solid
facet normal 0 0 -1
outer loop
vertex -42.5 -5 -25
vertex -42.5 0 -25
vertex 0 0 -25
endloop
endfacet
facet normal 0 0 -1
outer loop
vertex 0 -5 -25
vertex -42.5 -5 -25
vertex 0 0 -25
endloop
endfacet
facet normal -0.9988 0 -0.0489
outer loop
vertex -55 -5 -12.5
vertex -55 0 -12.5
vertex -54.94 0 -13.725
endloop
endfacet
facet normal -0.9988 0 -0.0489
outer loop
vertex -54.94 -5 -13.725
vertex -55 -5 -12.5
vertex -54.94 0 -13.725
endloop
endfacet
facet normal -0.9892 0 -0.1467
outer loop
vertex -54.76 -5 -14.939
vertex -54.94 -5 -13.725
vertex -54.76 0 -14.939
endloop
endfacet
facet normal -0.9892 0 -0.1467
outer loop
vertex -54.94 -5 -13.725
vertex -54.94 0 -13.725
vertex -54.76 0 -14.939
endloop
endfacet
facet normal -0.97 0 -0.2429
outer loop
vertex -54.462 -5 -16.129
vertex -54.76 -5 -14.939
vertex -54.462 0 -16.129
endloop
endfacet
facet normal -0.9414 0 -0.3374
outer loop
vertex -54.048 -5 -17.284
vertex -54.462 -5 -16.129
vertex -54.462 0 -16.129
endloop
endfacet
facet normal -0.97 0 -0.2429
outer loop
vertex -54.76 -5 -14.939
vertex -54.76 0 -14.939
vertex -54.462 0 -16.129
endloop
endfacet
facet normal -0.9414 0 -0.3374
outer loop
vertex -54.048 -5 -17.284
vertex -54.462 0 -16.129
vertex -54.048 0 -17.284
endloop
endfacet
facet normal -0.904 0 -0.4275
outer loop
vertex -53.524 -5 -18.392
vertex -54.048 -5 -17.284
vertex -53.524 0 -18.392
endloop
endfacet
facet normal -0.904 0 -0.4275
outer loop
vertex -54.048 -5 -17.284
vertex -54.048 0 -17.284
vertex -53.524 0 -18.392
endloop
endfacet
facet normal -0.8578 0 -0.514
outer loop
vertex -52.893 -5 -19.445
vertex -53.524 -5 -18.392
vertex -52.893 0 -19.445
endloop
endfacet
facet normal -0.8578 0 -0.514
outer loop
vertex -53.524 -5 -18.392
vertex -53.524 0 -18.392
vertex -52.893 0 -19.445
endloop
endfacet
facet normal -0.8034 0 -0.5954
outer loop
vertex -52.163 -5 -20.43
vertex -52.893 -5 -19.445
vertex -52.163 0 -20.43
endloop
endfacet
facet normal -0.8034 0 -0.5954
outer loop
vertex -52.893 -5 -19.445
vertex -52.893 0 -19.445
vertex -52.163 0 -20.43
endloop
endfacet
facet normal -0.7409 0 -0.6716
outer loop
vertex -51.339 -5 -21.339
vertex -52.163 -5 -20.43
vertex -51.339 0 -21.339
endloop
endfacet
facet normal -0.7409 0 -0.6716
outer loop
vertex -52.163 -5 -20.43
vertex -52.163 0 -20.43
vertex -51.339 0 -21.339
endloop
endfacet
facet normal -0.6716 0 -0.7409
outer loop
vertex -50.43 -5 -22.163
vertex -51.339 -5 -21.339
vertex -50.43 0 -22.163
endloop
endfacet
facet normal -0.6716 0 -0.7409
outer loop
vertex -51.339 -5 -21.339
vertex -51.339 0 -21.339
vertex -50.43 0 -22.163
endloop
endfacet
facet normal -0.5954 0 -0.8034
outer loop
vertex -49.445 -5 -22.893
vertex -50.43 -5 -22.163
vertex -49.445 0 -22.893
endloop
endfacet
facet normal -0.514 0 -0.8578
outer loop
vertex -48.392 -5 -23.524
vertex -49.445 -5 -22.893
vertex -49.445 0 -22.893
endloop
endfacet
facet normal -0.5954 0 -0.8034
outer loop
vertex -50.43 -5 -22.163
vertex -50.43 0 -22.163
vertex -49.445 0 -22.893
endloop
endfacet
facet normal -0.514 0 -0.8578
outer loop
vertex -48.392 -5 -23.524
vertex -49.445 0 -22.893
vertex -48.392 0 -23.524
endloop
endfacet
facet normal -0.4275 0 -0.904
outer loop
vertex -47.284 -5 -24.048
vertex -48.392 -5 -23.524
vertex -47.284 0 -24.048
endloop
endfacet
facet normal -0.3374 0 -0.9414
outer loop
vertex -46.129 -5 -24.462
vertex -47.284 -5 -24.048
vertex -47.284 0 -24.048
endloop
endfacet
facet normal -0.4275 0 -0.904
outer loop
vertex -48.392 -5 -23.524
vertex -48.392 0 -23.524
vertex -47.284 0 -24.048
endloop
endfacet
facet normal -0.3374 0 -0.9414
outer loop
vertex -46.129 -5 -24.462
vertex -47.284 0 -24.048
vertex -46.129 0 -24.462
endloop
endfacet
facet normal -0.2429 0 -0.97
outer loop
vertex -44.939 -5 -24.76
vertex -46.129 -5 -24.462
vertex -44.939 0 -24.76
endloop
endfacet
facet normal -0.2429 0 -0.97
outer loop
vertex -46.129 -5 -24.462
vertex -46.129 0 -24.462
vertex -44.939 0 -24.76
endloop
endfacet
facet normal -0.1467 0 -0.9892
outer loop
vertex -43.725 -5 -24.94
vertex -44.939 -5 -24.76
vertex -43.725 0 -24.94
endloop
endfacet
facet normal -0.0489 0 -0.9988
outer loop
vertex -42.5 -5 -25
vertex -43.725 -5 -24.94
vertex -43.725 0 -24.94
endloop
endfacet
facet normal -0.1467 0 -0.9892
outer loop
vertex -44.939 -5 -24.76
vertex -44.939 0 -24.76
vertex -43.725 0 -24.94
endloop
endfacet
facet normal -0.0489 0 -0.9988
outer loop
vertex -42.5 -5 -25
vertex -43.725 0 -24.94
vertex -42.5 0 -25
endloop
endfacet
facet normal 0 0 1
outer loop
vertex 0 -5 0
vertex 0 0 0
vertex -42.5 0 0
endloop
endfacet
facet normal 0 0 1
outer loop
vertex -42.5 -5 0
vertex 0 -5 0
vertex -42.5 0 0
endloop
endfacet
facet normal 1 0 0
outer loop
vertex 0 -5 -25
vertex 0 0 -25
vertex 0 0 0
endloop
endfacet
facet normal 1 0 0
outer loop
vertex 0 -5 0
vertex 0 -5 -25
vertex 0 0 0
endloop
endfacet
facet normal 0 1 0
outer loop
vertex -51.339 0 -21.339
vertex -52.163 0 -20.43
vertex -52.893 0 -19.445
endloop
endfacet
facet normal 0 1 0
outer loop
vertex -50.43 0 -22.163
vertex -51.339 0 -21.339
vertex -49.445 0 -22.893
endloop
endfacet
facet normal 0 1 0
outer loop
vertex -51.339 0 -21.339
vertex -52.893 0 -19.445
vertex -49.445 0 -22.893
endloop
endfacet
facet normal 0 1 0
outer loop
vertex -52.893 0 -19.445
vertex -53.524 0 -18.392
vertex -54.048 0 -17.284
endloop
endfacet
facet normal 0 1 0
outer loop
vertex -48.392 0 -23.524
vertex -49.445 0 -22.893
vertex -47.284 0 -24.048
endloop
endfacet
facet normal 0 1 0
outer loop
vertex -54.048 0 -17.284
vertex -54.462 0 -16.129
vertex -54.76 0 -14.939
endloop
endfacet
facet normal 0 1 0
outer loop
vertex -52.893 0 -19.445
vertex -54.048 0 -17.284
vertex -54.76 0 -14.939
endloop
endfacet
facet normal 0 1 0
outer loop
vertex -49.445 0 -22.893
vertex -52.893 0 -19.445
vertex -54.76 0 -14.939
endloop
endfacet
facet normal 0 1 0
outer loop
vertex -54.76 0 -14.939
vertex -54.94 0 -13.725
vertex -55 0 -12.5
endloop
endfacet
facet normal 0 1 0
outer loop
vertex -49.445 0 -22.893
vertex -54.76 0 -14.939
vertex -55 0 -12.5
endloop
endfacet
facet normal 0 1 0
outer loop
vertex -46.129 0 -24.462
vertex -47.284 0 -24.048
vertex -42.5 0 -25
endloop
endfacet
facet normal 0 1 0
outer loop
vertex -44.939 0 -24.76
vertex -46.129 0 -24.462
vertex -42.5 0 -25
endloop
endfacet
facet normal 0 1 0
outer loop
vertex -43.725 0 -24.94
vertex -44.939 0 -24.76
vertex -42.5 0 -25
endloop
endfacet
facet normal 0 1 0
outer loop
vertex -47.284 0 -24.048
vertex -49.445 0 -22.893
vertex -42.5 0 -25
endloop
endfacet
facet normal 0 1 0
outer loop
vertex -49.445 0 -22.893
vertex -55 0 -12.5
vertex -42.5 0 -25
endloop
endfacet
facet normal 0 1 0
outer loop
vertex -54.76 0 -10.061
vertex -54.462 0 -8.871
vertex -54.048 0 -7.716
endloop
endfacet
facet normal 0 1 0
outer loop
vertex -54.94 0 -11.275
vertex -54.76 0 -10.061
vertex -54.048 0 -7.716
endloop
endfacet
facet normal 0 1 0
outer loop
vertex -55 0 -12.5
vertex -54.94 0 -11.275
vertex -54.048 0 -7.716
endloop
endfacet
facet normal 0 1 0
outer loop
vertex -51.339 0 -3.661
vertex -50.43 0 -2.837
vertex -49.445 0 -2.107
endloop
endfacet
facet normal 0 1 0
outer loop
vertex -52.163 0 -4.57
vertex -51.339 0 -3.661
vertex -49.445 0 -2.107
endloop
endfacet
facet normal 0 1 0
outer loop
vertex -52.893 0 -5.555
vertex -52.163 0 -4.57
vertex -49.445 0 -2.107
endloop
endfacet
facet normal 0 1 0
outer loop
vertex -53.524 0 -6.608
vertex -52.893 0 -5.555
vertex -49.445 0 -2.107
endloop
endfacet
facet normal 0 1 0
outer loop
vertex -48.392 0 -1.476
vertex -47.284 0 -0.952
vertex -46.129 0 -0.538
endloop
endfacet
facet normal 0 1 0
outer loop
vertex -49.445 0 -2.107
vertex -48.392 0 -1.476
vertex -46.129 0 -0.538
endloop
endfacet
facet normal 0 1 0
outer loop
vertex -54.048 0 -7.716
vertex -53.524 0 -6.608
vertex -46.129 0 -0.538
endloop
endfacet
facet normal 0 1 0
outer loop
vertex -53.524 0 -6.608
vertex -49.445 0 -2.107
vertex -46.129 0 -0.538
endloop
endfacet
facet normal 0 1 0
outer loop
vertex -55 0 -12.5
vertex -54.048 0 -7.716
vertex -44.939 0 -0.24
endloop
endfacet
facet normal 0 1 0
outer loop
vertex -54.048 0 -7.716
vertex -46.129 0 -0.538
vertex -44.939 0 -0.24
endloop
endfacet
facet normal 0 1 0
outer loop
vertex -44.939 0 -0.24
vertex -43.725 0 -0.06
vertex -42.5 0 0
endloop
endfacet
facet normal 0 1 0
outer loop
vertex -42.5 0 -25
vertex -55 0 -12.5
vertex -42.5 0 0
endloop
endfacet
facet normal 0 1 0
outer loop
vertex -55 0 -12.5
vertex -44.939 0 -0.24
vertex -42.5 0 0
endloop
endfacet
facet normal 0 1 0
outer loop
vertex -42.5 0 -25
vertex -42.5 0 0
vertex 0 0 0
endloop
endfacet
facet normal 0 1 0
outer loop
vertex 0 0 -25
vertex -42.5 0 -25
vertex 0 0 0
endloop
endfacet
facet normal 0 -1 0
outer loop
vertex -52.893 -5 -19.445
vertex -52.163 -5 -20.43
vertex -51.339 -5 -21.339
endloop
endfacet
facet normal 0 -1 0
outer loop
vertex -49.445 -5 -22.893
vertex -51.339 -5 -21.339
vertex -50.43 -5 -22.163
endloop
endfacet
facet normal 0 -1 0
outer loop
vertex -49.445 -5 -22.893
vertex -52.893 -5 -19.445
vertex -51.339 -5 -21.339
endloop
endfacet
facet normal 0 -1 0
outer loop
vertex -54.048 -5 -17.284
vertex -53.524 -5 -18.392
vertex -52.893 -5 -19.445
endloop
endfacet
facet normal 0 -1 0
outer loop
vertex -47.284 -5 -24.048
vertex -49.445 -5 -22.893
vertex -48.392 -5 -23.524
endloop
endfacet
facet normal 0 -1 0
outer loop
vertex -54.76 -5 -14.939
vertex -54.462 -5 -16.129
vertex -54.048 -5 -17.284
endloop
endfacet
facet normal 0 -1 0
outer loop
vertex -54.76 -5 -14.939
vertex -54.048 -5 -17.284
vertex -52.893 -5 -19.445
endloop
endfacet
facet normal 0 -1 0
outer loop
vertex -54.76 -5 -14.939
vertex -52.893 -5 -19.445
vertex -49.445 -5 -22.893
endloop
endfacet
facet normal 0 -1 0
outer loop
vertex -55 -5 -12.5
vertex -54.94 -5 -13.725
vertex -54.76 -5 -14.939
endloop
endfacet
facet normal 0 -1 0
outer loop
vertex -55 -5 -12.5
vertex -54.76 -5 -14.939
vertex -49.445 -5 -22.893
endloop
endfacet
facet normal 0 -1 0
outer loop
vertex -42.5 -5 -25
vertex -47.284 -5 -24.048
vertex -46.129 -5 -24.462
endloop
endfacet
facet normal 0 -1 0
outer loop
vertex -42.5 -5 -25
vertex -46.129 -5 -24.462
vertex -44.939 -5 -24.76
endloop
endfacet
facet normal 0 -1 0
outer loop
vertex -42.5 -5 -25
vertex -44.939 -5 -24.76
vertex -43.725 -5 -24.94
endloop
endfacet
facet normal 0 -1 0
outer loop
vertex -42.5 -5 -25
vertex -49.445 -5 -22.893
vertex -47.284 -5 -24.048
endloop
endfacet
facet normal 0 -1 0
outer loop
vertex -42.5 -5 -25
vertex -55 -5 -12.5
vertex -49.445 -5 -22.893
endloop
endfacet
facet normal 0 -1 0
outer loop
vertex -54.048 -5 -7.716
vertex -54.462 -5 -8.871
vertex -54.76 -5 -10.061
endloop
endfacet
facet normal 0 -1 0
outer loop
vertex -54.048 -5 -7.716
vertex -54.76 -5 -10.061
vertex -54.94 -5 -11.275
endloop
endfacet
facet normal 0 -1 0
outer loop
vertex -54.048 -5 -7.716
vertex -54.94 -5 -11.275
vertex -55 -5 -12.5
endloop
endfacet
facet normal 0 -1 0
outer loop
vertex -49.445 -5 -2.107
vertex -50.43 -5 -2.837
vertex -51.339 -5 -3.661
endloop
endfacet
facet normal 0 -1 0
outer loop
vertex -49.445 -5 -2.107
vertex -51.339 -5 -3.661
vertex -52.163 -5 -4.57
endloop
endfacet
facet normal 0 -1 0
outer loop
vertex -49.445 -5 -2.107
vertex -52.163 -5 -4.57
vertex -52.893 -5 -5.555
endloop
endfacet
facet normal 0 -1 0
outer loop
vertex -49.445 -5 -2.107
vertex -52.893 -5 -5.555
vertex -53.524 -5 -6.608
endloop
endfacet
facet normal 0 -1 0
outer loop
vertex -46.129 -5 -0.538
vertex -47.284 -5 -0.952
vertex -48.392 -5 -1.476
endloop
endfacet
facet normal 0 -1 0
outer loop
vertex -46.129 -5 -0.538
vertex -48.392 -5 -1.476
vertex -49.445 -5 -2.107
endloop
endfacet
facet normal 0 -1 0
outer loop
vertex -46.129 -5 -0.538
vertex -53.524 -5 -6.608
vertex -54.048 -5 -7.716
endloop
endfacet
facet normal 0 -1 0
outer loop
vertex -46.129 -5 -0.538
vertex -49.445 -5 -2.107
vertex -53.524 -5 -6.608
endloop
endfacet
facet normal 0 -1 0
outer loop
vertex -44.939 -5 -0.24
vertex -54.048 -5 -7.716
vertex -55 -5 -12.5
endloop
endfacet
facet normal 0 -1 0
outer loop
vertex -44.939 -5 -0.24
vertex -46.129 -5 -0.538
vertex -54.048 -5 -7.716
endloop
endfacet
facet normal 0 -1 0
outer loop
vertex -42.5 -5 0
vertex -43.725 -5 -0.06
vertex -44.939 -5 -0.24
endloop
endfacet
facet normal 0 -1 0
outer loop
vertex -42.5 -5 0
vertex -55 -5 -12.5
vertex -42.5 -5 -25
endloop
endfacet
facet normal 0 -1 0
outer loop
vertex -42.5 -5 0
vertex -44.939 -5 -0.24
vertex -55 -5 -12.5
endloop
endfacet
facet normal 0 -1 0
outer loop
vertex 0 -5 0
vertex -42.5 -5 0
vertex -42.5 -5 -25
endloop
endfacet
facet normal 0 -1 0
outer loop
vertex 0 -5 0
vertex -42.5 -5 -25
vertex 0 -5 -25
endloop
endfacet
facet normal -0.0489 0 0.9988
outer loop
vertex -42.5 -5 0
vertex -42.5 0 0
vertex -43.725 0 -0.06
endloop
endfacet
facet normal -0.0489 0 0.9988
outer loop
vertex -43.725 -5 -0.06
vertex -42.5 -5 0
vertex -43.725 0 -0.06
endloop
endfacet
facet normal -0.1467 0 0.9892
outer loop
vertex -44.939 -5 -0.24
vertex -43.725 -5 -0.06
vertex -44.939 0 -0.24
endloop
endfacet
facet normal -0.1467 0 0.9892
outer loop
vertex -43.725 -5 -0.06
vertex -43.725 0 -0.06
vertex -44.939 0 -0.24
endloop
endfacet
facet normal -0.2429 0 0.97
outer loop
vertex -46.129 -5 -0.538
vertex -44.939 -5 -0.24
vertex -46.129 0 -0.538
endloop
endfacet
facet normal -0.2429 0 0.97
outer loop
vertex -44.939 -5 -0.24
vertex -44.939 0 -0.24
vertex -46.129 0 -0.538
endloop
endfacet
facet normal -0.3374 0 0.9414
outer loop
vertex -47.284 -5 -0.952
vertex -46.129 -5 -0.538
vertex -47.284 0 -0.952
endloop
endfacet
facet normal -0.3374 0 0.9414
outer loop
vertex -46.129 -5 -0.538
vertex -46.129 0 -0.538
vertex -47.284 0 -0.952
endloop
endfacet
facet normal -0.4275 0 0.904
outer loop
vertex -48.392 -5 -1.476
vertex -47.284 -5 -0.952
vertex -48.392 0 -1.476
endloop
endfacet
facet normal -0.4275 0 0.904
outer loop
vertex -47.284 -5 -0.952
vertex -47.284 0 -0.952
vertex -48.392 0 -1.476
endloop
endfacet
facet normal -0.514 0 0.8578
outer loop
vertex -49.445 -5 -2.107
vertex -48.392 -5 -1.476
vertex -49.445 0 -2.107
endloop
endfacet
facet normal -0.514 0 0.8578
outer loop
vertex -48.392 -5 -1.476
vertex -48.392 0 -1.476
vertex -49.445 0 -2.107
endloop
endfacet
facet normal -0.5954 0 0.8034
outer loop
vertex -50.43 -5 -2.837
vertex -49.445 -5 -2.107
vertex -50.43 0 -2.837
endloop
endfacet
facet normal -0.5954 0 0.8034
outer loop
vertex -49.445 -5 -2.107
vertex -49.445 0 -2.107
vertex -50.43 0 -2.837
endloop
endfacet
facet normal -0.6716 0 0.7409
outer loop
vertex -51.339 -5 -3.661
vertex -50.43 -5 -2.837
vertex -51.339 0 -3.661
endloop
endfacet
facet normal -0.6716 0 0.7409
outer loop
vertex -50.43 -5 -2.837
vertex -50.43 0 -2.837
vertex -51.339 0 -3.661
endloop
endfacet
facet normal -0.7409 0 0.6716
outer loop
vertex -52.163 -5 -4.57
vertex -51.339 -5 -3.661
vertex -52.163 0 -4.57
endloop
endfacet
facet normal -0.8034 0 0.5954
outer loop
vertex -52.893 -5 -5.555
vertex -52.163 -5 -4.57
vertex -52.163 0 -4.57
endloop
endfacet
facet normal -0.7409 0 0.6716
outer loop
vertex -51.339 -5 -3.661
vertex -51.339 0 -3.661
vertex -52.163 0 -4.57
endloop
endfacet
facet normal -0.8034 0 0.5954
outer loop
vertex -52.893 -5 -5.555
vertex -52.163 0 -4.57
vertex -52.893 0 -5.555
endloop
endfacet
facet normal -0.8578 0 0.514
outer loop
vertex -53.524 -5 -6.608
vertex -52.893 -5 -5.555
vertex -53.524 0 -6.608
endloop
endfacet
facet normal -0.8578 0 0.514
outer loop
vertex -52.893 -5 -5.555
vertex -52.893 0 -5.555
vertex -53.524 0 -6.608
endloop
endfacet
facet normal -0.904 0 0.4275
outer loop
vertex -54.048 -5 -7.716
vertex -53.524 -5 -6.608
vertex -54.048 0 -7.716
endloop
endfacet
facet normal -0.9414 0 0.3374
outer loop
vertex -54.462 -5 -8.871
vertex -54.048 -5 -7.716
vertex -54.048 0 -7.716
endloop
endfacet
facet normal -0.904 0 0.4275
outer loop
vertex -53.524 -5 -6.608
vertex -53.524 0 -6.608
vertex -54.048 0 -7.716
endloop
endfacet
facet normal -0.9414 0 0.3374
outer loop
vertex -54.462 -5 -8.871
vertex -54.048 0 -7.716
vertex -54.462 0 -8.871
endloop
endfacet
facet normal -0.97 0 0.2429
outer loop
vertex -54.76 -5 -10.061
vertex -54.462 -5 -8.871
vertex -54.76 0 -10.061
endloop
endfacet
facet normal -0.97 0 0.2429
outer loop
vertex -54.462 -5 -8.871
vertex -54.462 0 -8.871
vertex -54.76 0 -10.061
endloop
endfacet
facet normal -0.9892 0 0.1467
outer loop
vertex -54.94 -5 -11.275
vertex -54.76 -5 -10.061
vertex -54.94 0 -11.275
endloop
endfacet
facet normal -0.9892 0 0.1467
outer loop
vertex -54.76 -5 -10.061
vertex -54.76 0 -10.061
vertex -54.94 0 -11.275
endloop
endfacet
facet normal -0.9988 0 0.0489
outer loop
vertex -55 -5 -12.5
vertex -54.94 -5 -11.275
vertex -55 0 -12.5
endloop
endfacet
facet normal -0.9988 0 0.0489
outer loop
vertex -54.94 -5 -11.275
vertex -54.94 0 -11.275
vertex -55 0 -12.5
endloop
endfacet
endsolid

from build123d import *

# Parameters (mm, degrees)
F1_DEPTH = 5


with BuildPart() as f1:
    # F0 (on Front) → F1 (new body)
    with BuildSketch(Plane.XZ):
        with BuildLine():
            Line((0, 0), (-42.5, 0))
            ThreePointArc((-42.5, 0), (-51.338835, -3.661165), (-55, -12.5))
            ThreePointArc((-55, -12.5), (-51.338835, -21.338835), (-42.5, -25))
            Line((-42.5, -25), (0, -25))
            Line((0, -25), (0, 0))
        make_face()
    extrude(amount=F1_DEPTH)


solid = f1.part
